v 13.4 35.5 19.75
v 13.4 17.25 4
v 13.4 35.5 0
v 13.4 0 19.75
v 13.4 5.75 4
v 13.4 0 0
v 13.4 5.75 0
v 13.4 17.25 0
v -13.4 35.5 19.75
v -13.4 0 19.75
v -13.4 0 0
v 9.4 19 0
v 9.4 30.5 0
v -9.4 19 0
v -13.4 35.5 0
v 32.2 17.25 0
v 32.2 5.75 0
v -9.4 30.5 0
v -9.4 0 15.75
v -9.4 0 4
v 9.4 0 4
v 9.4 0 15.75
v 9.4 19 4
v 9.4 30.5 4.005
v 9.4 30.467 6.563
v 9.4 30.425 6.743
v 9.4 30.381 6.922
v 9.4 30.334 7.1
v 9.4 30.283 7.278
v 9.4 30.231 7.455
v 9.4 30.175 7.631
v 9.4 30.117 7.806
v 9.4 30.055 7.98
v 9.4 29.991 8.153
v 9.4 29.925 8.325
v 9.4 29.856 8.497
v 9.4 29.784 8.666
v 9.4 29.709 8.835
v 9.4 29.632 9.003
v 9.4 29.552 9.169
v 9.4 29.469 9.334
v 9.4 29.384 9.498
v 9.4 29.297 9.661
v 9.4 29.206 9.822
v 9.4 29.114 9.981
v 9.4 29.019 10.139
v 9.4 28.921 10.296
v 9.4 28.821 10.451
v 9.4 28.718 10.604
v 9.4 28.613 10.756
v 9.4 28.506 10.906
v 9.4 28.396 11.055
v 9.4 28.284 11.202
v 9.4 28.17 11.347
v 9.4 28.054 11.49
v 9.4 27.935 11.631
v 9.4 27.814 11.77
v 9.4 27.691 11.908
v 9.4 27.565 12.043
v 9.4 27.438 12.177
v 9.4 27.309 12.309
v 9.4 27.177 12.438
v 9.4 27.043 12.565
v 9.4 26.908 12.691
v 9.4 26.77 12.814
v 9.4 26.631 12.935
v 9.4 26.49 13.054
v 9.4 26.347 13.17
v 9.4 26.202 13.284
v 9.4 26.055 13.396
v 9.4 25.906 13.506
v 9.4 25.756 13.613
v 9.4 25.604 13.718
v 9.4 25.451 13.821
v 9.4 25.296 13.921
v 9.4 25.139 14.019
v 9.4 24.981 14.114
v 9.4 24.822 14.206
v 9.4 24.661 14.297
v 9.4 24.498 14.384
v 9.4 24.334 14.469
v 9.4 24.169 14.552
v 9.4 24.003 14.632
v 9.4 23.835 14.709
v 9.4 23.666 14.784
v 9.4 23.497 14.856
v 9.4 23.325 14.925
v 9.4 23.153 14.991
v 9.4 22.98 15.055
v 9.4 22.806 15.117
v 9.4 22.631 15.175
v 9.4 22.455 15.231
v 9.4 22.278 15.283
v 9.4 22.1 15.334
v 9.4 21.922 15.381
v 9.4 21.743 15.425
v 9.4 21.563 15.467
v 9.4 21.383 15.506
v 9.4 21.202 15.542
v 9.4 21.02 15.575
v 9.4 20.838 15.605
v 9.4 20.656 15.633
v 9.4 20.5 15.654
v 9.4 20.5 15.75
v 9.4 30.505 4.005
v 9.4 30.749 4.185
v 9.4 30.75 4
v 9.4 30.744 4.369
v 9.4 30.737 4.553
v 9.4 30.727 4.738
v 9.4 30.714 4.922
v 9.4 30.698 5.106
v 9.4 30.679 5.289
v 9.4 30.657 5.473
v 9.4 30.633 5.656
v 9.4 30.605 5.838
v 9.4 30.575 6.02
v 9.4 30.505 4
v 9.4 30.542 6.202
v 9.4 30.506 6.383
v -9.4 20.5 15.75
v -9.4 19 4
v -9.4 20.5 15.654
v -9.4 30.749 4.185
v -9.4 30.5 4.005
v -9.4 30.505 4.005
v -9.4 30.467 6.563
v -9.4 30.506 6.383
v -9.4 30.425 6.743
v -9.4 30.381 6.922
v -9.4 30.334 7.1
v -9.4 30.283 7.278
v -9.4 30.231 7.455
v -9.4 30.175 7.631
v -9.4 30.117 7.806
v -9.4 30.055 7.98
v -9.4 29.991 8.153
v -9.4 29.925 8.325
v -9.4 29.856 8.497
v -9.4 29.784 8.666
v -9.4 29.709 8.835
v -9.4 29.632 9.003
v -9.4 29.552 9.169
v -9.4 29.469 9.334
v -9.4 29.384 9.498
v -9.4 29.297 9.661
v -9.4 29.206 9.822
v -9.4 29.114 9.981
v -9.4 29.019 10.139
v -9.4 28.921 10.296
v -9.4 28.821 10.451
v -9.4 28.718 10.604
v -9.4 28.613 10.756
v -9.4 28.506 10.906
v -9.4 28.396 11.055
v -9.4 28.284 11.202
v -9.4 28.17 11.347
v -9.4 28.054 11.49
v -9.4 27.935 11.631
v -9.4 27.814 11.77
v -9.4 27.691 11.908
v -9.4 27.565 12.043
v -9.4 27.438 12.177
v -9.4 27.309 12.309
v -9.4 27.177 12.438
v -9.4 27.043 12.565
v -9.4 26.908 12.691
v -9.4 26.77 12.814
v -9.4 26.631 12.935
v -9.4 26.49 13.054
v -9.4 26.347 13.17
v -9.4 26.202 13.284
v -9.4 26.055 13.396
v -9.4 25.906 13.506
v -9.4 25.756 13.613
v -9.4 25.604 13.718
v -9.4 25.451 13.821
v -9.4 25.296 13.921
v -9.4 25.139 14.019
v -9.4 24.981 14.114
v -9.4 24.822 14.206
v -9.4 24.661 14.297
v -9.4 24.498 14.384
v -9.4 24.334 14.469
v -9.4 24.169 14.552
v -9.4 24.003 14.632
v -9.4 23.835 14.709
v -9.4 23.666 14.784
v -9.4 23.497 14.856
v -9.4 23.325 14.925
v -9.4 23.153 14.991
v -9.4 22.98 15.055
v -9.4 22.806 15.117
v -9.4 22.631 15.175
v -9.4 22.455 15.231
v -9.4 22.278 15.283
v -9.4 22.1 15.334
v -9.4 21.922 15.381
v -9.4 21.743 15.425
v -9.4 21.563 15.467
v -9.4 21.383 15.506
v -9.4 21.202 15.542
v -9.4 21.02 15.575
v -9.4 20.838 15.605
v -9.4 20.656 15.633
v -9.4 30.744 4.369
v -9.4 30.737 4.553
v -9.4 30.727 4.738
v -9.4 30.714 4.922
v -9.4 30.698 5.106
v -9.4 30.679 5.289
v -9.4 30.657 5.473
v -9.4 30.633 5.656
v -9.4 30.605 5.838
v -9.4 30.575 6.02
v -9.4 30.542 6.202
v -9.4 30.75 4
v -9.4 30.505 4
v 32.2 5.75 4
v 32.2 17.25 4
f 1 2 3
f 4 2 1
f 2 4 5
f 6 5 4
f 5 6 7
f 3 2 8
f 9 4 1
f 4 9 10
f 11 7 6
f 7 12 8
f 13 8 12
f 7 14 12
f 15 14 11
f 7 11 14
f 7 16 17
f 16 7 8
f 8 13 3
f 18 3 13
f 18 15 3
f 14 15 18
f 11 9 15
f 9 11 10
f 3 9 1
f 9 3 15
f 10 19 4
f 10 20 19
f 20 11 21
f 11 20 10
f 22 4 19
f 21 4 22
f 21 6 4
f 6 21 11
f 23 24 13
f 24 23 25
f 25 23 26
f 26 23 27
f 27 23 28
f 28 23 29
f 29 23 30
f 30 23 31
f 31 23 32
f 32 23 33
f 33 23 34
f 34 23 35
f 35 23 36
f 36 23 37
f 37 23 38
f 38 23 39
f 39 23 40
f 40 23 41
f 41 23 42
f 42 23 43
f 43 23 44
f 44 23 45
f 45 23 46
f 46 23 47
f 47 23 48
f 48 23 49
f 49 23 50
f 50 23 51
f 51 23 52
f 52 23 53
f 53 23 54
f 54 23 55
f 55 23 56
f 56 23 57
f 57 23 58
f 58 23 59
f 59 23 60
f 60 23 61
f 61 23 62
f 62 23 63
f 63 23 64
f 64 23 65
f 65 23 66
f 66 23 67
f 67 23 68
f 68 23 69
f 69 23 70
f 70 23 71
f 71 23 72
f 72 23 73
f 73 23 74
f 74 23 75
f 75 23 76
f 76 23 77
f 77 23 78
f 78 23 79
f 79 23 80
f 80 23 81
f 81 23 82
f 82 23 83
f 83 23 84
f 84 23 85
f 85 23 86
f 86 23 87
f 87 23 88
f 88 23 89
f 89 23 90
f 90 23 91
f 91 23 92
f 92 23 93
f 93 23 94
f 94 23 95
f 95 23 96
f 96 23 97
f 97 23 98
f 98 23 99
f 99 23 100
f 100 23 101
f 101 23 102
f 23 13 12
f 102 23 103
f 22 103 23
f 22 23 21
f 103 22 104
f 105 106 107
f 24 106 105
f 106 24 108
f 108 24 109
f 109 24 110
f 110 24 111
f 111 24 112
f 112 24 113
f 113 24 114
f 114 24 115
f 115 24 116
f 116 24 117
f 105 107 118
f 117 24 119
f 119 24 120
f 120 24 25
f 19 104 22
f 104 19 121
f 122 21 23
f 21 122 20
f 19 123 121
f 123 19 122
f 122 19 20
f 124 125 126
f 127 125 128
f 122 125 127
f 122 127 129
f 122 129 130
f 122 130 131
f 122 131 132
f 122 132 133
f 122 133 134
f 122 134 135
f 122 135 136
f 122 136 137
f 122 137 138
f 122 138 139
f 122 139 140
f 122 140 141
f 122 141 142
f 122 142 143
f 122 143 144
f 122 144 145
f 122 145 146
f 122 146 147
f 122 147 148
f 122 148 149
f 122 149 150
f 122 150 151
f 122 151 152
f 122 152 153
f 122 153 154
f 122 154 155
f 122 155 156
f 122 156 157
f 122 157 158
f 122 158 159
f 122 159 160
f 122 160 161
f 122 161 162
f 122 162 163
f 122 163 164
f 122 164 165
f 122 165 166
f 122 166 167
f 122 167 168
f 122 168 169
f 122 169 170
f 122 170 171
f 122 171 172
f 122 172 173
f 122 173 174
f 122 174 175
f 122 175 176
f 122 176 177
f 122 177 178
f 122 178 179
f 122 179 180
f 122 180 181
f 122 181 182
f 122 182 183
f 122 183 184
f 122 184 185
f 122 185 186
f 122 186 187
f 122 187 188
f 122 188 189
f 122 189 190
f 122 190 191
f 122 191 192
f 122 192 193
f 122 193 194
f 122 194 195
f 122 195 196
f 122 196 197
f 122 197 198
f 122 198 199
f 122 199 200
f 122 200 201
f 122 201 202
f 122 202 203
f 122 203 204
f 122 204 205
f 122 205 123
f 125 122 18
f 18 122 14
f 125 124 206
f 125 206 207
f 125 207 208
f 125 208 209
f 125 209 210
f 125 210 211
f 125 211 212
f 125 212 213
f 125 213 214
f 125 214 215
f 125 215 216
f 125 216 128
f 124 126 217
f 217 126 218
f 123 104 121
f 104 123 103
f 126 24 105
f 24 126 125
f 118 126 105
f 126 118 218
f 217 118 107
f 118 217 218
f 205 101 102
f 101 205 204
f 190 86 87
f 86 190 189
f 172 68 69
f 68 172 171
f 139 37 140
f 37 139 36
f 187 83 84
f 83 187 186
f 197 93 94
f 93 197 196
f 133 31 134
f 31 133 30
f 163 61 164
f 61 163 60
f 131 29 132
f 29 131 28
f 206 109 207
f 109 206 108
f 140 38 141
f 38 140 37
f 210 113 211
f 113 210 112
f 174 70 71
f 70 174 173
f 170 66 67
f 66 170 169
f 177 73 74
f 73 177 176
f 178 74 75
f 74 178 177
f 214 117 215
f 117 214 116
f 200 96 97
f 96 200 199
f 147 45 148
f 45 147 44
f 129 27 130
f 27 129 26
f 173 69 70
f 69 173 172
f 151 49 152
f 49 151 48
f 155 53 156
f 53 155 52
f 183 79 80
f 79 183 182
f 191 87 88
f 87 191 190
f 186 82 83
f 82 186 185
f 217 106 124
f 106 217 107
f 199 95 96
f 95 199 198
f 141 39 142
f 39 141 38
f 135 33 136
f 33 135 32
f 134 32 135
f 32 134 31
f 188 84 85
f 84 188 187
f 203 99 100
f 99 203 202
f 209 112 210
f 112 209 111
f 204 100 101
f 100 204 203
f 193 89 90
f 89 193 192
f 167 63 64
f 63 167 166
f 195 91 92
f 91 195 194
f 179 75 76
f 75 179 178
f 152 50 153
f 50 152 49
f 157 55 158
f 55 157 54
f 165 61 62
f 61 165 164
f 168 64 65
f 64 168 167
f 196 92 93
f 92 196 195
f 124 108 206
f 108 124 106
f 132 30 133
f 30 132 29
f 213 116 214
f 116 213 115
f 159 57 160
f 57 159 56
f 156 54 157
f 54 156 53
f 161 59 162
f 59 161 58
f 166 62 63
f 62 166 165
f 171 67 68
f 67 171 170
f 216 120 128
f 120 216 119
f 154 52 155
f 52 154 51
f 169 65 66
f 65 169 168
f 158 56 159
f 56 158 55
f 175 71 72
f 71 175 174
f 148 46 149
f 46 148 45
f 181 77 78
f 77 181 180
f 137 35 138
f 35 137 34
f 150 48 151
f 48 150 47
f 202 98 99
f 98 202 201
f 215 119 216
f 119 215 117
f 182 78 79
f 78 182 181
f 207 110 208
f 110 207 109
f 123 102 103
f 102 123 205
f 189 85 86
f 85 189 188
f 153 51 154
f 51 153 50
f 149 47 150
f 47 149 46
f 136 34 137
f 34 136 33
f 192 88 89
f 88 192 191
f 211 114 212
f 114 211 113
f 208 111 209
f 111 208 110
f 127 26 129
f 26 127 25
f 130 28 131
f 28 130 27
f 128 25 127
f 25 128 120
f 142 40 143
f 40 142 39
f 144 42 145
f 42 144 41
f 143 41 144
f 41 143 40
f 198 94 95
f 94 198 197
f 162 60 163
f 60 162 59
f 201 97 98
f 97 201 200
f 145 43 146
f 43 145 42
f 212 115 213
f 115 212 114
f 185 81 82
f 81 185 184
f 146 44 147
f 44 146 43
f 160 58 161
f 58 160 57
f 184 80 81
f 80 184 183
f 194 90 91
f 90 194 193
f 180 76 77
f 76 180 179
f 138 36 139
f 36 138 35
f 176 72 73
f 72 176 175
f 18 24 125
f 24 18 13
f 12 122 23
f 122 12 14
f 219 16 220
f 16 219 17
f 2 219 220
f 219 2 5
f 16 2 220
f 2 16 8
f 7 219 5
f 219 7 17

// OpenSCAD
body = [18.8, 11.5, 11.75];
wireGap = 20;
mountThickness = 4;
zFix = 0.01;
// Fix cylinder rendering - the y-plane is messed up.
/* cylinderFix=0.5; */
cylinderFix=0;
$fn=100;

module arc(theta, thickness) {
  // Minus 1 because this increments one iteration ahead - therefore we cover
  // the final case properly without going over.
  for(i = [0 : $fn - 1])
    let(
      angle1 = (i / $fn) * theta,
      angle2 = ((i+1) / $fn) * theta,
      x1 = cos(angle1),
      y1 = sin(angle1),
      x2 = cos(angle2),
      y2 = sin(angle2)
    )
      // There might be more efficient ways to bundle this up (such as making
      // it a single polygon call), but vector mapping like that in OpenSCAD
      // eludes me.
      polygon([
        [0, 0],
        [x1 * thickness, y1 * thickness],
        [x2 * thickness, y2 * thickness],
      ]);
}

module wireCavity() {
  translate([0, body.y * 2 - mountThickness, mountThickness]) {
    difference() {
      rotate([0, -90, 0])
        linear_extrude(height=body.x, center=true)
          arc(90, body.z);
      /* rotate([0, 90, 0]) */
      /*   cylinder(r=body.z, h=body.x, center=true); */
      let(fixedBody = [
        body.x + zFix,
        body.y + zFix + cylinderFix,
        body.z + zFix,
      ]) {
        translate([0, body.y / -2, body.z / 2])
          cube(fixedBody, center=true);
        translate([0, body.y / -2, body.z / -2])
          cube(fixedBody, center=true);
        translate([0, body.y / 2, body.z / -2])
          cube(fixedBody, center=true);
      }
    }
    // Cut a hole through the shround to the bottom where the wires can come
    // out.
    translate([0, cylinderFix / 2 + body.y / 2, -mountThickness / 2])
      cube([body.x, body.y, mountThickness + zFix * 2], center=true);
  }
}

module shroud() {
  translate([0, 0, body.z / 2 + mountThickness / 2])
    difference() {
      translate([0, (body.y + wireGap + mountThickness) / 2, mountThickness / 2])
        cube([
          body.x + (mountThickness * 2),
          body.y + wireGap + mountThickness,
          body.z + (mountThickness * 2),
        ], center=true);
      translate([0, body.y / 2 + mountThickness, mountThickness / 2])
        cube([
          body.x,
          body.y + wireGap/ 2,
          body.z,
        ], center=true);
    }
}

module mountCountersink() {
  let(dims = [
    body.x,
    body.y,
    mountThickness,
  ]) {
    translate([body.x + mountThickness, dims.y, dims.z / 2])
      cube(dims, center=true);
  }
}

difference() {
  shroud();
  /*
  translate([
    (body.x + (mountThickness * 2)) / -2,
    (body.y + wireGap + mountThickness) / 2,
    (body.z + (mountThickness * 2)) / 2,
  ])
  cube([
    body.x + (mountThickness * 2) + zFix,
    body.y + wireGap + mountThickness + zFix,
    body.z + (mountThickness * 2) + zFix,
    ], center=true);
  */
  wireCavity();
}

/*
translate([10, 0, 0]) {
  wireCavity();
}
*/
mountCountersink();
